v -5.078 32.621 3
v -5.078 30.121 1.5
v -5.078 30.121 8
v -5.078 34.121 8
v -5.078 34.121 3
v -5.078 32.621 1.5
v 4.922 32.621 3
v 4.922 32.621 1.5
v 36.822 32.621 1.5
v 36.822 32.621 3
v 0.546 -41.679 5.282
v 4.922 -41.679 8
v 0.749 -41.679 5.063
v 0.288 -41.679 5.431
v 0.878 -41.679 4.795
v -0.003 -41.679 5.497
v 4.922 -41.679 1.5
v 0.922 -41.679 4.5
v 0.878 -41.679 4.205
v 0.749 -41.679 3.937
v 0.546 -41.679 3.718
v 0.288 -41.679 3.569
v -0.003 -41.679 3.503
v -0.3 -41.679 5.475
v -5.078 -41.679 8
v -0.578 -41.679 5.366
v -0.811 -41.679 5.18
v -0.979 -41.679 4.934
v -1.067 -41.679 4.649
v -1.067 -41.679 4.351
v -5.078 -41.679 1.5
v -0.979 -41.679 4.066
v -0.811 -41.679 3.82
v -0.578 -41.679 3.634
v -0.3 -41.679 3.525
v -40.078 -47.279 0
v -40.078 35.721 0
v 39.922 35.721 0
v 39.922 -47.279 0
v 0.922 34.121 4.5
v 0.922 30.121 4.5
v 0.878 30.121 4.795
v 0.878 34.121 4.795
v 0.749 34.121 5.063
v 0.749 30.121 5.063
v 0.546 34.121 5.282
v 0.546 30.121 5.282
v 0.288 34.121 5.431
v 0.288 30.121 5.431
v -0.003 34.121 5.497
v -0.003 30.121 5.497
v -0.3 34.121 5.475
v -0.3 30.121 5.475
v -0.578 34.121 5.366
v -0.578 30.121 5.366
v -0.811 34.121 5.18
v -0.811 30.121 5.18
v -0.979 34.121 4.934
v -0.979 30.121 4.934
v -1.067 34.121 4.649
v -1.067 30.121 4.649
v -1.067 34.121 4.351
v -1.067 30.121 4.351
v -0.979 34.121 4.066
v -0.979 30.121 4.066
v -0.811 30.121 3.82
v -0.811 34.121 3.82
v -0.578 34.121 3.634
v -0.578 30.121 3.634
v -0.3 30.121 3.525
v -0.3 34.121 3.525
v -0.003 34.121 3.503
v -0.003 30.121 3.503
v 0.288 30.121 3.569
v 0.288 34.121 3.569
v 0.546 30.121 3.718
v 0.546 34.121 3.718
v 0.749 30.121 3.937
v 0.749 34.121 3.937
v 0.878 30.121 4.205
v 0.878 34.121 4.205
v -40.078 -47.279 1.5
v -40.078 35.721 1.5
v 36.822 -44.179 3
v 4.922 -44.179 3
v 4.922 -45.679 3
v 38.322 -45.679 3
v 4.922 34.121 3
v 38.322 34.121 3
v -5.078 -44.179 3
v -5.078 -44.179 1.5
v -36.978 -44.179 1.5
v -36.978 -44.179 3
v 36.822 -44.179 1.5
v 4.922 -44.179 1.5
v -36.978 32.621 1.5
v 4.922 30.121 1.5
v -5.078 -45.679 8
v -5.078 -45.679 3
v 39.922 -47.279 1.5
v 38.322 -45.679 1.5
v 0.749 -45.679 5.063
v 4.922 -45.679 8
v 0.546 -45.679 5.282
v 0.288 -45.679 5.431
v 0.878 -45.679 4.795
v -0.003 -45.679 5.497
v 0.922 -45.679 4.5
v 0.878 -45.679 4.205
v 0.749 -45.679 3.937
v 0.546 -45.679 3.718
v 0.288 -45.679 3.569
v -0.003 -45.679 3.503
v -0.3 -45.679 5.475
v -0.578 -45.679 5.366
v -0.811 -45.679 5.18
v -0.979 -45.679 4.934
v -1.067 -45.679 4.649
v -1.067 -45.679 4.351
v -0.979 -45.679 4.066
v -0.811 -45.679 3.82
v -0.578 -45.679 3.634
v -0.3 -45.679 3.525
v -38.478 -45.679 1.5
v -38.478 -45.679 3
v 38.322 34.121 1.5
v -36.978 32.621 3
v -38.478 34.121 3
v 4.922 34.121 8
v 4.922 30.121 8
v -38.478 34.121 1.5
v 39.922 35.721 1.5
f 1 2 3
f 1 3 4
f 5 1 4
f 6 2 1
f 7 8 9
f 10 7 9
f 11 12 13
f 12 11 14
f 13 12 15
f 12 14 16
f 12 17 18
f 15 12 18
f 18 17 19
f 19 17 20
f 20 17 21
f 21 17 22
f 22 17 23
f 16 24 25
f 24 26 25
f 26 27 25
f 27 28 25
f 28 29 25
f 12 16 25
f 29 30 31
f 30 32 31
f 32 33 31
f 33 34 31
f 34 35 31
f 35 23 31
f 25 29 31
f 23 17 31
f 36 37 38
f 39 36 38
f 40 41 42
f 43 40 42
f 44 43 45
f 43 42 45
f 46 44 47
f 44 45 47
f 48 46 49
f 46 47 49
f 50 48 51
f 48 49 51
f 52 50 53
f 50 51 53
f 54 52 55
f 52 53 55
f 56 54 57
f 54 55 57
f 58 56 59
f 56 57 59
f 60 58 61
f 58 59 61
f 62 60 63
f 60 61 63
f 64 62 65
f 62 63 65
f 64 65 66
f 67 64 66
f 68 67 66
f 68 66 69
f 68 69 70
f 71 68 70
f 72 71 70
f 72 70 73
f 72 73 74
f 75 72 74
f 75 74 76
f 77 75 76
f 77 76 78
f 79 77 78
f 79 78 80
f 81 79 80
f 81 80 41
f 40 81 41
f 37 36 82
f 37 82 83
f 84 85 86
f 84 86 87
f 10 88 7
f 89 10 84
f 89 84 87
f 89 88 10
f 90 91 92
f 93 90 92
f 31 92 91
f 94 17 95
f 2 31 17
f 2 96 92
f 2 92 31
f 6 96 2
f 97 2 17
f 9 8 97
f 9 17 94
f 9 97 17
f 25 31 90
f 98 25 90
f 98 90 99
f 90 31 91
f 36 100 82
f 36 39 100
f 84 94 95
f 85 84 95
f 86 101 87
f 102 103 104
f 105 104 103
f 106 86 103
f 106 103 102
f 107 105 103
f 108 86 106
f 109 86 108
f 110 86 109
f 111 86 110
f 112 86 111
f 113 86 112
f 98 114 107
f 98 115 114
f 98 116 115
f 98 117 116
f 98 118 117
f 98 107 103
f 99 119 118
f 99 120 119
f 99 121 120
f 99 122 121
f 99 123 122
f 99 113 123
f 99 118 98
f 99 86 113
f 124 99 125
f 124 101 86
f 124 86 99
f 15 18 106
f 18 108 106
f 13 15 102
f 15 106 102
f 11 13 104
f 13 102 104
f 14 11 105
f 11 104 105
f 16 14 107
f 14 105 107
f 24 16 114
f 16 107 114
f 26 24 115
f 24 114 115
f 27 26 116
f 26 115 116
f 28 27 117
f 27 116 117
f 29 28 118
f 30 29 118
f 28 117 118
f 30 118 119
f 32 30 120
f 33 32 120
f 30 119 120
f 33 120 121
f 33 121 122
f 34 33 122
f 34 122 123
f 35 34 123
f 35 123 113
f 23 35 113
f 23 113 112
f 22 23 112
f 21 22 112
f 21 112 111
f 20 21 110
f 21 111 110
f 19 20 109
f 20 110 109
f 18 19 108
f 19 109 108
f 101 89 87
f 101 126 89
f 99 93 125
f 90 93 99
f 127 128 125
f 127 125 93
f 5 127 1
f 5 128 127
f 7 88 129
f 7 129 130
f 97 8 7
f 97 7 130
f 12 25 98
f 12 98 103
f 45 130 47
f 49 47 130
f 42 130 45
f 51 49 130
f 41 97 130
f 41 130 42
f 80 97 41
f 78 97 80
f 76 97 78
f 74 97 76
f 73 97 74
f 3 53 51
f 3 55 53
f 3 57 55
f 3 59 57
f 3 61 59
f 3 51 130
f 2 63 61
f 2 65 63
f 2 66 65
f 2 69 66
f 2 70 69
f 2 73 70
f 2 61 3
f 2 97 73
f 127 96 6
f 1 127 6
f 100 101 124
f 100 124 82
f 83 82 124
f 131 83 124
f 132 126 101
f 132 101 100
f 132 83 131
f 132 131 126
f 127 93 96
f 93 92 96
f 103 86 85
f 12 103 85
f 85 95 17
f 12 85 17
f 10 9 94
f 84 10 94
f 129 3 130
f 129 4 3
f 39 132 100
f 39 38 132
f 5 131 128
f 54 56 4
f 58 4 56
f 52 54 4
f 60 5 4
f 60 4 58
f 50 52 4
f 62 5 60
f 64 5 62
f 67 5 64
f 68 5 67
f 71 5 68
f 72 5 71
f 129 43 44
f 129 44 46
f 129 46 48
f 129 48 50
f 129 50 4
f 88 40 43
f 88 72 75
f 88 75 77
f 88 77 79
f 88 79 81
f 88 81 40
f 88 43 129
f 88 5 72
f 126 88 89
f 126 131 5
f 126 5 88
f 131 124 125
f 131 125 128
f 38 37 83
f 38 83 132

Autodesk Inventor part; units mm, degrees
ref_plane "YZ Plane" through (0, 0, 0) normal (1, 0, 0) x (0, 1, 0)
ref_plane "XZ Plane" through (0, 0, 0) normal (0, 1, 0) x (-1, 0, 0)
ref_plane "XY Plane" through (0, 0, 0) normal (0, 0, 1) x (1, 0, 0)
sketch "Skizze1" plane through (0, 0, 0) normal (0, 0, 1) x (1, 0, 0)
  line L0 (-40.0777, 35.7212) -> (39.9223, 35.7212)
  line L1 (39.9223, 35.7212) -> (39.9223, -47.2788)
  line L2 (39.9223, -47.2788) -> (-40.0777, -47.2788)
  line L3 (-40.0777, -47.2788) -> (-40.0777, 35.7212)
  line L4 (-38.4777, 34.1212) -> (38.3223, 34.1212)
  line L5 (38.3223, 34.1212) -> (38.3223, -45.6788)
  line L6 (38.3223, -45.6788) -> (-38.4777, -45.6788)
  line L7 (-38.4777, -45.6788) -> (-38.4777, 34.1212)
  line L8 (-36.9777, 32.6212) -> (36.8223, 32.6212)
  line L9 (36.8223, 32.6212) -> (36.8223, -44.1788)
  line L10 (36.8223, -44.1788) -> (-36.9777, -44.1788)
  line L11 (-36.9777, -44.1788) -> (-36.9777, 32.6212)
  line L12 (-5.0777, -45.6788) -> (4.9223, -45.6788)
  line L13 (4.9223, -45.6788) -> (4.9223, -41.6788)
  line L14 (4.9223, -41.6788) -> (-5.0777, -41.6788)
  line L15 (-5.0777, -41.6788) -> (-5.0777, -45.6788)
  line L16 (-5.0777, 34.1212) -> (4.9223, 34.1212)
  line L17 (4.9223, 34.1212) -> (4.9223, 30.1212)
  line L18 (4.9223, 30.1212) -> (-5.0777, 30.1212)
  line L19 (-5.0777, 30.1212) -> (-5.0777, 34.1212)
  point P0 (0, 0)
  point P1 (-0.0777, -41.6788)
  point P2 (-0.0777, 30.1212)
  point P3 (4.9223, 32.6212)
  point P4 (-5.0777, 32.6212)
  point P5 (-5.0777, -44.1788)
  point P6 (4.9223, -44.1788)
  dimension "d0" = 80
  dimension "d1" = 83
  dimension "d2" = 1.6
  dimension "d3" = 1.5
  dimension "d4" = 1.6
  dimension "d5" = 1.5
  dimension "d6" = 1.6
  dimension "d7" = 1.5
  dimension "d8" = 1.6
  dimension "d9" = 1.5
  dimension "d10" = 10
  dimension "d11" = 4
  dimension "d12" = 40
  dimension "d13" = 4
  dimension "d14" = 10
  dimension "d16" = 40
extrude "Extrusion1" add sketch "Skizze1" along normal blind 1.5 contours L0 L1 L2 L3 | L19 L18 L17 L8 L9 L10 L13 L14 L15 L11
extrude "Extrusion2" add sketch "Skizze1" along normal blind 3 contours L4 L19 L8 L11 L10 L15 L6 L7 | L4 L5 L6 L13 L10 L9 L8 L17
extrude "Extrusion3" add sketch "Skizze1" along normal blind 8 contours L4 L17 L8 L19 | L8 L17 L18 L19 | L15 L10 L13 L6 | L15 L14 L13 L10
sketch "Skizze2" plane through (-38.4777, -45.6788, 1.5) normal (0, -1, 0) x (1, 0, 0)
  circle A0 centre (38.4, 3) radius 1
  line L0 (-1.6, 0) -> (78.4, 0) projected
  line L1 (33.4, 1.5) -> (33.4, 6.5) projected
  point P0 (38.4777, -1.5)
  dimension "d23" = 2
  dimension "d24" = 3
  dimension "d25" = 5
extrude "Extrusion4" cut sketch "Skizze2" against normal through all
properties part number "Gyrosensor_Deckel"
